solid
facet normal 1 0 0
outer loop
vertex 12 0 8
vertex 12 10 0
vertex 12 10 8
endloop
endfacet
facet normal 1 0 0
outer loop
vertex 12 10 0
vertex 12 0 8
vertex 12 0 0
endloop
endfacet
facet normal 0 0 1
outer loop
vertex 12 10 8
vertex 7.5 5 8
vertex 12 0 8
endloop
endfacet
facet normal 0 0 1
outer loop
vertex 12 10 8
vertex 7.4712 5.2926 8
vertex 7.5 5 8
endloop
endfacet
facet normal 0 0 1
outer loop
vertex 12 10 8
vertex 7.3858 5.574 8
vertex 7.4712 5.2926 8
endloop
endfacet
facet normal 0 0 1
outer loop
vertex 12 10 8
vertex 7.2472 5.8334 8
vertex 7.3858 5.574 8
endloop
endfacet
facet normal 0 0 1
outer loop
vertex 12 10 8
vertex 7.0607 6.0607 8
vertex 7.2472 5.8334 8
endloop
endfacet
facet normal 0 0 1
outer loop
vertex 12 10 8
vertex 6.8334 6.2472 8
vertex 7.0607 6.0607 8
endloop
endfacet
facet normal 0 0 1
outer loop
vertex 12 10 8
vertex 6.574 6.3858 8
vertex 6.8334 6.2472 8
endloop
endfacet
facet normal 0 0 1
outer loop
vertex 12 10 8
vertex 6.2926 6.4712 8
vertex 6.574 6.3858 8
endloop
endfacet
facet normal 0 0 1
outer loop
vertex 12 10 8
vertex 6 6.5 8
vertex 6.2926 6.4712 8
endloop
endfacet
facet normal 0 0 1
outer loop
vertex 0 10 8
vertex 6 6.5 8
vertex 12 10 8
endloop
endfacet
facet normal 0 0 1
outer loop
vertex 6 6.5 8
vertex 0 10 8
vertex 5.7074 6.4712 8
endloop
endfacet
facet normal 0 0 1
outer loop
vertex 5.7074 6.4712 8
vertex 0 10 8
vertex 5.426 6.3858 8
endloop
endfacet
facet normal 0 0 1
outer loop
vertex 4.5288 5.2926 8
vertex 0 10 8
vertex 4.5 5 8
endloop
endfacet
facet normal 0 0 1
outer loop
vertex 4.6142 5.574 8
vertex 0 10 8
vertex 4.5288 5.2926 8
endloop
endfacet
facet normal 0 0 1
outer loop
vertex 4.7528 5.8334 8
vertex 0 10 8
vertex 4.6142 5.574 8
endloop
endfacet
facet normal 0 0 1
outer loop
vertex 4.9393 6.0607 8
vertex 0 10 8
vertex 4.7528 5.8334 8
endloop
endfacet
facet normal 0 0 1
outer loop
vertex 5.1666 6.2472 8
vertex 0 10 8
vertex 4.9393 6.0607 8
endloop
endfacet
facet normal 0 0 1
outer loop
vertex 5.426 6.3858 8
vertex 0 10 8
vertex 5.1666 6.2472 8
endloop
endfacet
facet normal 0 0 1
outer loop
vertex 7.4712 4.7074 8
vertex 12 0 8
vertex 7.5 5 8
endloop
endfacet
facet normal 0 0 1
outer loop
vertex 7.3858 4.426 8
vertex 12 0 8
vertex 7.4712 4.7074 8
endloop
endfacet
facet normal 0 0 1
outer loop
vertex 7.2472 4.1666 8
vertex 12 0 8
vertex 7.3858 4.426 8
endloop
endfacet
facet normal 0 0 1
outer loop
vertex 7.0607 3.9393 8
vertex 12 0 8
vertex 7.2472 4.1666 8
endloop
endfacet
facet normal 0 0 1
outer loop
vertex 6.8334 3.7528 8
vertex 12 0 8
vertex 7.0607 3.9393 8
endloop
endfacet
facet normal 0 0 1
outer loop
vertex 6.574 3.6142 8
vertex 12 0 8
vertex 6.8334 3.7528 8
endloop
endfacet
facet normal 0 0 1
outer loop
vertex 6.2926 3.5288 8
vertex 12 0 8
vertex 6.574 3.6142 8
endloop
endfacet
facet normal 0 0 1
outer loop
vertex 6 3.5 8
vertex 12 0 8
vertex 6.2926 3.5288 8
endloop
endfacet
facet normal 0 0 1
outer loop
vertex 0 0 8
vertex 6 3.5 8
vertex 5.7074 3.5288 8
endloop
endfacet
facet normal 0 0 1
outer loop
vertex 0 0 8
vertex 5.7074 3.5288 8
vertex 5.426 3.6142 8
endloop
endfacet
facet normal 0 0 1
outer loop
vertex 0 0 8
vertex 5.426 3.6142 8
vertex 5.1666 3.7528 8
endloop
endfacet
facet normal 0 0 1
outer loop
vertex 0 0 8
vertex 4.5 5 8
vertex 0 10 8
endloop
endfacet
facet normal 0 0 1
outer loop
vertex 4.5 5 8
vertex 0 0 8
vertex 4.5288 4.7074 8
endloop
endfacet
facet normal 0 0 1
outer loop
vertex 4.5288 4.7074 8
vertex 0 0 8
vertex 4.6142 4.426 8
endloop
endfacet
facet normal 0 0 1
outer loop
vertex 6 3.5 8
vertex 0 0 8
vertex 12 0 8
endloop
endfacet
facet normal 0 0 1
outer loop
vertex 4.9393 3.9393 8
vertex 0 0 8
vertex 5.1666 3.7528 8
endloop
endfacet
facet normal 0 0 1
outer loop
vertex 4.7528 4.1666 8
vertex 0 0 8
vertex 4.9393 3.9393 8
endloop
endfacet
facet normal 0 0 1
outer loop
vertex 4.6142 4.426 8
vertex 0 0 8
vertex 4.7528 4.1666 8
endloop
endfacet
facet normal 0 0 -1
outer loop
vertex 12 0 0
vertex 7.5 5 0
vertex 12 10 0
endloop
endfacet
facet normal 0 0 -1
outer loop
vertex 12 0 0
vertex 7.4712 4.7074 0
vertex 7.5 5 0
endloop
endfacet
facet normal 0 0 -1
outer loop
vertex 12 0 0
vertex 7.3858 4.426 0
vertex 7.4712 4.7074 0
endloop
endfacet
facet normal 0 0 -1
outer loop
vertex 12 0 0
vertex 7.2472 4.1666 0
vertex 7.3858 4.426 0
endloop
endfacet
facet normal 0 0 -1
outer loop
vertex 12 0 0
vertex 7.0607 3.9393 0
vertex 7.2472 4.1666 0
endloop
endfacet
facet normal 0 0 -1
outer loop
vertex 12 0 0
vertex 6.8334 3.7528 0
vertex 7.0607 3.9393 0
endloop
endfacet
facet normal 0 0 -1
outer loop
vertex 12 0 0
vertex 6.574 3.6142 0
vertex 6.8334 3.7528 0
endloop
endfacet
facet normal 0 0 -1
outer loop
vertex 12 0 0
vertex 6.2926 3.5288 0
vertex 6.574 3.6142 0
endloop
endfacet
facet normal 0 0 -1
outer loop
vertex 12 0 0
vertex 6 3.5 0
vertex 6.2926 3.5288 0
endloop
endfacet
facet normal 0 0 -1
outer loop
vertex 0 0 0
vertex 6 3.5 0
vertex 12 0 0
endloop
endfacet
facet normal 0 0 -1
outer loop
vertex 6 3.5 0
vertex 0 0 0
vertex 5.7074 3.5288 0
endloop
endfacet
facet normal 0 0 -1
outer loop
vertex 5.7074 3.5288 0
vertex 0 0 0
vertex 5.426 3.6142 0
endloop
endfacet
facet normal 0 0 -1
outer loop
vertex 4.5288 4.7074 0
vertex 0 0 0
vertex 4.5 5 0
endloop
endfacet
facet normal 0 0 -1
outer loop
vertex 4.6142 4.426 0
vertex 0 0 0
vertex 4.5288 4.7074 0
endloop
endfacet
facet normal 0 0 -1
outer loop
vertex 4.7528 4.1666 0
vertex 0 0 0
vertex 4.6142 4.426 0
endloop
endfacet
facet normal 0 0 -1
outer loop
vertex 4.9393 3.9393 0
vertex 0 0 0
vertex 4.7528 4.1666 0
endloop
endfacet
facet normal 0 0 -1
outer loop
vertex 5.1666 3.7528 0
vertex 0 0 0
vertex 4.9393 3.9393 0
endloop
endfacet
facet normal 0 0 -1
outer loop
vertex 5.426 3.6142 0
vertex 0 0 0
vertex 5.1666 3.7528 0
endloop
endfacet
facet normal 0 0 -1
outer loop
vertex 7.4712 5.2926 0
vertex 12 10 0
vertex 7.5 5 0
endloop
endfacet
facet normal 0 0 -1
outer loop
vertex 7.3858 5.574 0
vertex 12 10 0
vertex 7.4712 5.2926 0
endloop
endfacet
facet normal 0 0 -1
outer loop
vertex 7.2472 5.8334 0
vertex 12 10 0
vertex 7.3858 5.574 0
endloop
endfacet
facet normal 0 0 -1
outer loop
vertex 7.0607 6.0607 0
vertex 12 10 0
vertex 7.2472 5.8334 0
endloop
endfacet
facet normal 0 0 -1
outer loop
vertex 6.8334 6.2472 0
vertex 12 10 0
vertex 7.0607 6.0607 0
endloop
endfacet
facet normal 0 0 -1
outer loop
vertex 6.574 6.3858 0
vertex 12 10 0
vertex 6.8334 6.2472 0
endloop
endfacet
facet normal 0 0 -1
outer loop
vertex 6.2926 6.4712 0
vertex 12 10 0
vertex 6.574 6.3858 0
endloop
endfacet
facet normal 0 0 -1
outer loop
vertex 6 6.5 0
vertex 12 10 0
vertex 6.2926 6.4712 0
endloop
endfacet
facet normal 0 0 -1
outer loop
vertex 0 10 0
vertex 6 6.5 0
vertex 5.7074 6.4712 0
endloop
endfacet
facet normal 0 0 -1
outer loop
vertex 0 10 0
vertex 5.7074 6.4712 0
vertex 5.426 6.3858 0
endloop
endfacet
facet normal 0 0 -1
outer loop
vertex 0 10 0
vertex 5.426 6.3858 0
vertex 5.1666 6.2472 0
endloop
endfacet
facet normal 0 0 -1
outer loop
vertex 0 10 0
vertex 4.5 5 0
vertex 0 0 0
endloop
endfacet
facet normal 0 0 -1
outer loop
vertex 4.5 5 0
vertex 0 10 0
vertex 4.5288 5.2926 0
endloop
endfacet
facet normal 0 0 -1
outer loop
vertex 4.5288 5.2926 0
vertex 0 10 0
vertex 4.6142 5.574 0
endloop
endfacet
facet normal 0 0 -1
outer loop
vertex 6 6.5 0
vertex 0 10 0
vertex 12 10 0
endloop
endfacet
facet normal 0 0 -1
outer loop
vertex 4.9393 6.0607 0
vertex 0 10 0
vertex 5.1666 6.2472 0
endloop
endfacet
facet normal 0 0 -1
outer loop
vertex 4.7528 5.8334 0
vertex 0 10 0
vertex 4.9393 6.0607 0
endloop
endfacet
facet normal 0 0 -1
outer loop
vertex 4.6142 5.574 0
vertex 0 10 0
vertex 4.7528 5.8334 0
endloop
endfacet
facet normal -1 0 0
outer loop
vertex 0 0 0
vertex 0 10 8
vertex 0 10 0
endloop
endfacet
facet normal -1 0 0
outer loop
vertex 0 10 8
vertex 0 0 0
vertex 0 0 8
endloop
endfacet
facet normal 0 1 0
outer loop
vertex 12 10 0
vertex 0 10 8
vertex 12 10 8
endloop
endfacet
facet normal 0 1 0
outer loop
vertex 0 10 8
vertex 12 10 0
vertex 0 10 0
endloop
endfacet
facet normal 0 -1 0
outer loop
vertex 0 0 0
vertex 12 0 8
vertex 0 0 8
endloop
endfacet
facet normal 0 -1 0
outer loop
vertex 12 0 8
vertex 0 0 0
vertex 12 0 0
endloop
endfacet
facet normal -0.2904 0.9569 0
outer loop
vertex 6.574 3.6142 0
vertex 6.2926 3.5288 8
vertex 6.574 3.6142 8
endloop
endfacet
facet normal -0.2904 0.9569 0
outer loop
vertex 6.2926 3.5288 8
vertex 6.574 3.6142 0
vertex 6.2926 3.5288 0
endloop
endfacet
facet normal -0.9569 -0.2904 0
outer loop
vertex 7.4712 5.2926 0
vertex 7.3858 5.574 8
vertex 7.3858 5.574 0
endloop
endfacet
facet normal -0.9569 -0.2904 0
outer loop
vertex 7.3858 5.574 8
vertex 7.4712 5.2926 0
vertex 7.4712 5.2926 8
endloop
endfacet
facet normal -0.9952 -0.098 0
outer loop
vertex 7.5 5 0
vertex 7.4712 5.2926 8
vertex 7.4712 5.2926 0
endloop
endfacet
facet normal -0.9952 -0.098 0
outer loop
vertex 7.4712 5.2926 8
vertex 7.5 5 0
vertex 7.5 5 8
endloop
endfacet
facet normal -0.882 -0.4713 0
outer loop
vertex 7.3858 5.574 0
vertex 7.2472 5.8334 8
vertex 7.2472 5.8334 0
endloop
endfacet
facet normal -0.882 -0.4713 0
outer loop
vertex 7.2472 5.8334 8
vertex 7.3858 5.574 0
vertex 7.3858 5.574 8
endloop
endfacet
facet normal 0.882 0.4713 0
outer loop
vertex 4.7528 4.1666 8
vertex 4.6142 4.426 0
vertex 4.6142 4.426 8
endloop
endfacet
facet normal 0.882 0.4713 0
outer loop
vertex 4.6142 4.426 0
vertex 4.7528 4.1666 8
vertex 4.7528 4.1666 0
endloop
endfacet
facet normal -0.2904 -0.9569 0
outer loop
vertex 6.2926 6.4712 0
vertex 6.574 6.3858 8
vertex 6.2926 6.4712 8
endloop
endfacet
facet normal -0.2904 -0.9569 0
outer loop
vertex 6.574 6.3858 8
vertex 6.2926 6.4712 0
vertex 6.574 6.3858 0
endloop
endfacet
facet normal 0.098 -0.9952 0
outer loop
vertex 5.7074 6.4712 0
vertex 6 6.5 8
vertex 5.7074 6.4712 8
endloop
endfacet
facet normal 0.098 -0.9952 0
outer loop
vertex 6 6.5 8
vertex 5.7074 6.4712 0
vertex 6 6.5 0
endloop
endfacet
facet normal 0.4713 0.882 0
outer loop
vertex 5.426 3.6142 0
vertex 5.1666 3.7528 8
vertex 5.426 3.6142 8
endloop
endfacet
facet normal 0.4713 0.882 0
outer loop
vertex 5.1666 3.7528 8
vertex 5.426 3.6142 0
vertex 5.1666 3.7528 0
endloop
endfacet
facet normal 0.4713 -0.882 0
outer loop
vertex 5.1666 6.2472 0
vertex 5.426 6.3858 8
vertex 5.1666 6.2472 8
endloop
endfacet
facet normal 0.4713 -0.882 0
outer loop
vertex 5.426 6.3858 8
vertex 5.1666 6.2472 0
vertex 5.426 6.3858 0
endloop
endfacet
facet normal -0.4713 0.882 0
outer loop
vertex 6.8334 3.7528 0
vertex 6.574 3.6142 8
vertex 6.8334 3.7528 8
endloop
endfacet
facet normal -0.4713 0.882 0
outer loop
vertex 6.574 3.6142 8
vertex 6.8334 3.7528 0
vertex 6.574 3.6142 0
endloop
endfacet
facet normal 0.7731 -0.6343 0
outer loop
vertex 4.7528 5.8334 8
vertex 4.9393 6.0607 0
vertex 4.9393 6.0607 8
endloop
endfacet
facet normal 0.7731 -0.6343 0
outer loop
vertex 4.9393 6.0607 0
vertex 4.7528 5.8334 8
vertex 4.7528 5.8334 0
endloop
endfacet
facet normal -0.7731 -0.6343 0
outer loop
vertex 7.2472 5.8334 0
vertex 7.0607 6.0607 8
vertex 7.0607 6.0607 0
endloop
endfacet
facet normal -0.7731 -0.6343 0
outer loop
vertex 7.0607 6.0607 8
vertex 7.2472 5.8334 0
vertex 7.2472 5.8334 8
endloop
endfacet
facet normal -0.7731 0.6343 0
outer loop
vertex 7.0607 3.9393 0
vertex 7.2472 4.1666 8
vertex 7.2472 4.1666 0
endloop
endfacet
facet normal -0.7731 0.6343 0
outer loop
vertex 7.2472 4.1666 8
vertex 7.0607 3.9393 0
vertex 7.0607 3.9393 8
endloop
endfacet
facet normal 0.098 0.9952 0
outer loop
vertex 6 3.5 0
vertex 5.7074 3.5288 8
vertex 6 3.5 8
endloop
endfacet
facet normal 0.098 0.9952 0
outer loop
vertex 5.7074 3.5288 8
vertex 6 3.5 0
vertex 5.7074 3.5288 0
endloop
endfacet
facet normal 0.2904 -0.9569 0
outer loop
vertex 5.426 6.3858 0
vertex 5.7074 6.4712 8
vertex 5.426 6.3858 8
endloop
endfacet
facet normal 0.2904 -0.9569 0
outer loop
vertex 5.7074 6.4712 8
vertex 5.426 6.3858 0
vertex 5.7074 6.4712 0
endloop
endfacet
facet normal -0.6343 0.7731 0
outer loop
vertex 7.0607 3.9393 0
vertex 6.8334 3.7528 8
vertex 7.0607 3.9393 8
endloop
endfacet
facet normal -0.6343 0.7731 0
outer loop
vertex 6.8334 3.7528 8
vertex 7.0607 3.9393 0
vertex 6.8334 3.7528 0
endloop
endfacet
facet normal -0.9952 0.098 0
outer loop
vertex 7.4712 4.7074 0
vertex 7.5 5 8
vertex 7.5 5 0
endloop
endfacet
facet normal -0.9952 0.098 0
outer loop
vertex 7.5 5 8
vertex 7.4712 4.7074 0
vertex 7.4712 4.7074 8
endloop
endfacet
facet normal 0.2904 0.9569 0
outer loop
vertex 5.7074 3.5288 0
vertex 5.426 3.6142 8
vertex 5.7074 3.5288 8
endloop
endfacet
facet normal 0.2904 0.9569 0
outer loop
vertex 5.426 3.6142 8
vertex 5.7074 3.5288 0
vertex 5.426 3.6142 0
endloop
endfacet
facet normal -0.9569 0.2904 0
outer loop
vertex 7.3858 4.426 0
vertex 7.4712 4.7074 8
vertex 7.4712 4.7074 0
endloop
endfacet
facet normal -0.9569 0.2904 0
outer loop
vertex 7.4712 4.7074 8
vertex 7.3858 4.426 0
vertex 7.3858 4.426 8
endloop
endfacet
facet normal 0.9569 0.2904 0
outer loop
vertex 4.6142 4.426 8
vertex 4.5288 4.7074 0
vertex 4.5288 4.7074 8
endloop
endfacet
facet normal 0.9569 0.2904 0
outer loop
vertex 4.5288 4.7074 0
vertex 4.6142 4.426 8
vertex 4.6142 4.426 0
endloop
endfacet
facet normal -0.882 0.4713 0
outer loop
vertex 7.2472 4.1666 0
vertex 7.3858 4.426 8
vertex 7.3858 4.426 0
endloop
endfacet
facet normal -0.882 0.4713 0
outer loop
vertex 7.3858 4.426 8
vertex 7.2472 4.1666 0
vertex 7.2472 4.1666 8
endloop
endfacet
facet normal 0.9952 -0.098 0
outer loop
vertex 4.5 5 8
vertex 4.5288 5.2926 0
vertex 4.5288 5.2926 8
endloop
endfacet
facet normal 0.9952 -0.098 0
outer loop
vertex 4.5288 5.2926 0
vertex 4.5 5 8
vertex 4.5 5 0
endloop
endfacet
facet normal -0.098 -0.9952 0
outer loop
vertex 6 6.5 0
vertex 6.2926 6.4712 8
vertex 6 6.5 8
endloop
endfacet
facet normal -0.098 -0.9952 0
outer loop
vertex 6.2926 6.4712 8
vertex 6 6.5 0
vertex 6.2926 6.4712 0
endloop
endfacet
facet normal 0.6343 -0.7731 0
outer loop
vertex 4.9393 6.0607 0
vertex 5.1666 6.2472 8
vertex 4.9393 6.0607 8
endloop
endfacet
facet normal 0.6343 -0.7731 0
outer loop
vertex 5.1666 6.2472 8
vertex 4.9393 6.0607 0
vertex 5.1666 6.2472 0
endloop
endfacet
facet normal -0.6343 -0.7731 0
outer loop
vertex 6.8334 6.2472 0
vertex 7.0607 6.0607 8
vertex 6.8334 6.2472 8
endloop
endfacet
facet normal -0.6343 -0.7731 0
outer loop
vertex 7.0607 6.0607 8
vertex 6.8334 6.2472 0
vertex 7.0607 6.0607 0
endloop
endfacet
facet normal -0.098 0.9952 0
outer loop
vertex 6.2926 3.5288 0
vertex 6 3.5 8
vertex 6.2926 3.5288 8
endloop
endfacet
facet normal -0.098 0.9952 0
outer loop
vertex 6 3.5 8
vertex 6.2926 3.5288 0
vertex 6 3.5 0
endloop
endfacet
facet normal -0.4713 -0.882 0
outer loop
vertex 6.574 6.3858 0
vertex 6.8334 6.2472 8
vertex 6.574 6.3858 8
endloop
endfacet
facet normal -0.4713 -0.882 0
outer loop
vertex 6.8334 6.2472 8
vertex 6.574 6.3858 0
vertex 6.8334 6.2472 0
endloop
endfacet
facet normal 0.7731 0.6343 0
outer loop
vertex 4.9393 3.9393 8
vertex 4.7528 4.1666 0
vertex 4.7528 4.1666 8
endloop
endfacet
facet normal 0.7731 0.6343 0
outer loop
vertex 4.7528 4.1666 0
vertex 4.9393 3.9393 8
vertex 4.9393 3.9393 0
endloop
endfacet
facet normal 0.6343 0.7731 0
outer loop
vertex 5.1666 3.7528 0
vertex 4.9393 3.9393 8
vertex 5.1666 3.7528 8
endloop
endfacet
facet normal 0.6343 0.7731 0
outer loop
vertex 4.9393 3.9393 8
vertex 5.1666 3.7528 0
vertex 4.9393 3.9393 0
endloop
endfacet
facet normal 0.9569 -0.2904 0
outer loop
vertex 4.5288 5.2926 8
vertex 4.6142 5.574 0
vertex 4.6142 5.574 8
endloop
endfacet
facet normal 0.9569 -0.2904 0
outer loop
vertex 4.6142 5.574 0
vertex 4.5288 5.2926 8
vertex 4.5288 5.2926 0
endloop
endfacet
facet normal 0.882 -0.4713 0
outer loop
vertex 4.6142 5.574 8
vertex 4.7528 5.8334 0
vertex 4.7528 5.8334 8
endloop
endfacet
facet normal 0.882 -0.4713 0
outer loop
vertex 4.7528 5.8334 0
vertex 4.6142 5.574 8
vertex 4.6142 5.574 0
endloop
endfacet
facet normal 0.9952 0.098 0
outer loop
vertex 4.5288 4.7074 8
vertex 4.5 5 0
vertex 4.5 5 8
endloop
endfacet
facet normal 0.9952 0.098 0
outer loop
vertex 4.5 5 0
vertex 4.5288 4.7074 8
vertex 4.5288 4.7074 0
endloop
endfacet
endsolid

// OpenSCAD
$fn = 32;

// ----------------------------------------------------------------------
// Micro pad: drilled pad, 5-20 mm class
// ----------------------------------------------------------------------

// --- parameters (mm) ---
pad_l = 12;               // pad length, X
pad_w = 10;               // pad width, Y
pad_t = 8;                // pad thickness, Z
hole_d = 3;               // through hole diameter

difference() {
  cube([pad_l, pad_w, pad_t]);
  translate([pad_l / 2, pad_w / 2, -1])
    cylinder(h = pad_t + 2, d = hole_d);
}
